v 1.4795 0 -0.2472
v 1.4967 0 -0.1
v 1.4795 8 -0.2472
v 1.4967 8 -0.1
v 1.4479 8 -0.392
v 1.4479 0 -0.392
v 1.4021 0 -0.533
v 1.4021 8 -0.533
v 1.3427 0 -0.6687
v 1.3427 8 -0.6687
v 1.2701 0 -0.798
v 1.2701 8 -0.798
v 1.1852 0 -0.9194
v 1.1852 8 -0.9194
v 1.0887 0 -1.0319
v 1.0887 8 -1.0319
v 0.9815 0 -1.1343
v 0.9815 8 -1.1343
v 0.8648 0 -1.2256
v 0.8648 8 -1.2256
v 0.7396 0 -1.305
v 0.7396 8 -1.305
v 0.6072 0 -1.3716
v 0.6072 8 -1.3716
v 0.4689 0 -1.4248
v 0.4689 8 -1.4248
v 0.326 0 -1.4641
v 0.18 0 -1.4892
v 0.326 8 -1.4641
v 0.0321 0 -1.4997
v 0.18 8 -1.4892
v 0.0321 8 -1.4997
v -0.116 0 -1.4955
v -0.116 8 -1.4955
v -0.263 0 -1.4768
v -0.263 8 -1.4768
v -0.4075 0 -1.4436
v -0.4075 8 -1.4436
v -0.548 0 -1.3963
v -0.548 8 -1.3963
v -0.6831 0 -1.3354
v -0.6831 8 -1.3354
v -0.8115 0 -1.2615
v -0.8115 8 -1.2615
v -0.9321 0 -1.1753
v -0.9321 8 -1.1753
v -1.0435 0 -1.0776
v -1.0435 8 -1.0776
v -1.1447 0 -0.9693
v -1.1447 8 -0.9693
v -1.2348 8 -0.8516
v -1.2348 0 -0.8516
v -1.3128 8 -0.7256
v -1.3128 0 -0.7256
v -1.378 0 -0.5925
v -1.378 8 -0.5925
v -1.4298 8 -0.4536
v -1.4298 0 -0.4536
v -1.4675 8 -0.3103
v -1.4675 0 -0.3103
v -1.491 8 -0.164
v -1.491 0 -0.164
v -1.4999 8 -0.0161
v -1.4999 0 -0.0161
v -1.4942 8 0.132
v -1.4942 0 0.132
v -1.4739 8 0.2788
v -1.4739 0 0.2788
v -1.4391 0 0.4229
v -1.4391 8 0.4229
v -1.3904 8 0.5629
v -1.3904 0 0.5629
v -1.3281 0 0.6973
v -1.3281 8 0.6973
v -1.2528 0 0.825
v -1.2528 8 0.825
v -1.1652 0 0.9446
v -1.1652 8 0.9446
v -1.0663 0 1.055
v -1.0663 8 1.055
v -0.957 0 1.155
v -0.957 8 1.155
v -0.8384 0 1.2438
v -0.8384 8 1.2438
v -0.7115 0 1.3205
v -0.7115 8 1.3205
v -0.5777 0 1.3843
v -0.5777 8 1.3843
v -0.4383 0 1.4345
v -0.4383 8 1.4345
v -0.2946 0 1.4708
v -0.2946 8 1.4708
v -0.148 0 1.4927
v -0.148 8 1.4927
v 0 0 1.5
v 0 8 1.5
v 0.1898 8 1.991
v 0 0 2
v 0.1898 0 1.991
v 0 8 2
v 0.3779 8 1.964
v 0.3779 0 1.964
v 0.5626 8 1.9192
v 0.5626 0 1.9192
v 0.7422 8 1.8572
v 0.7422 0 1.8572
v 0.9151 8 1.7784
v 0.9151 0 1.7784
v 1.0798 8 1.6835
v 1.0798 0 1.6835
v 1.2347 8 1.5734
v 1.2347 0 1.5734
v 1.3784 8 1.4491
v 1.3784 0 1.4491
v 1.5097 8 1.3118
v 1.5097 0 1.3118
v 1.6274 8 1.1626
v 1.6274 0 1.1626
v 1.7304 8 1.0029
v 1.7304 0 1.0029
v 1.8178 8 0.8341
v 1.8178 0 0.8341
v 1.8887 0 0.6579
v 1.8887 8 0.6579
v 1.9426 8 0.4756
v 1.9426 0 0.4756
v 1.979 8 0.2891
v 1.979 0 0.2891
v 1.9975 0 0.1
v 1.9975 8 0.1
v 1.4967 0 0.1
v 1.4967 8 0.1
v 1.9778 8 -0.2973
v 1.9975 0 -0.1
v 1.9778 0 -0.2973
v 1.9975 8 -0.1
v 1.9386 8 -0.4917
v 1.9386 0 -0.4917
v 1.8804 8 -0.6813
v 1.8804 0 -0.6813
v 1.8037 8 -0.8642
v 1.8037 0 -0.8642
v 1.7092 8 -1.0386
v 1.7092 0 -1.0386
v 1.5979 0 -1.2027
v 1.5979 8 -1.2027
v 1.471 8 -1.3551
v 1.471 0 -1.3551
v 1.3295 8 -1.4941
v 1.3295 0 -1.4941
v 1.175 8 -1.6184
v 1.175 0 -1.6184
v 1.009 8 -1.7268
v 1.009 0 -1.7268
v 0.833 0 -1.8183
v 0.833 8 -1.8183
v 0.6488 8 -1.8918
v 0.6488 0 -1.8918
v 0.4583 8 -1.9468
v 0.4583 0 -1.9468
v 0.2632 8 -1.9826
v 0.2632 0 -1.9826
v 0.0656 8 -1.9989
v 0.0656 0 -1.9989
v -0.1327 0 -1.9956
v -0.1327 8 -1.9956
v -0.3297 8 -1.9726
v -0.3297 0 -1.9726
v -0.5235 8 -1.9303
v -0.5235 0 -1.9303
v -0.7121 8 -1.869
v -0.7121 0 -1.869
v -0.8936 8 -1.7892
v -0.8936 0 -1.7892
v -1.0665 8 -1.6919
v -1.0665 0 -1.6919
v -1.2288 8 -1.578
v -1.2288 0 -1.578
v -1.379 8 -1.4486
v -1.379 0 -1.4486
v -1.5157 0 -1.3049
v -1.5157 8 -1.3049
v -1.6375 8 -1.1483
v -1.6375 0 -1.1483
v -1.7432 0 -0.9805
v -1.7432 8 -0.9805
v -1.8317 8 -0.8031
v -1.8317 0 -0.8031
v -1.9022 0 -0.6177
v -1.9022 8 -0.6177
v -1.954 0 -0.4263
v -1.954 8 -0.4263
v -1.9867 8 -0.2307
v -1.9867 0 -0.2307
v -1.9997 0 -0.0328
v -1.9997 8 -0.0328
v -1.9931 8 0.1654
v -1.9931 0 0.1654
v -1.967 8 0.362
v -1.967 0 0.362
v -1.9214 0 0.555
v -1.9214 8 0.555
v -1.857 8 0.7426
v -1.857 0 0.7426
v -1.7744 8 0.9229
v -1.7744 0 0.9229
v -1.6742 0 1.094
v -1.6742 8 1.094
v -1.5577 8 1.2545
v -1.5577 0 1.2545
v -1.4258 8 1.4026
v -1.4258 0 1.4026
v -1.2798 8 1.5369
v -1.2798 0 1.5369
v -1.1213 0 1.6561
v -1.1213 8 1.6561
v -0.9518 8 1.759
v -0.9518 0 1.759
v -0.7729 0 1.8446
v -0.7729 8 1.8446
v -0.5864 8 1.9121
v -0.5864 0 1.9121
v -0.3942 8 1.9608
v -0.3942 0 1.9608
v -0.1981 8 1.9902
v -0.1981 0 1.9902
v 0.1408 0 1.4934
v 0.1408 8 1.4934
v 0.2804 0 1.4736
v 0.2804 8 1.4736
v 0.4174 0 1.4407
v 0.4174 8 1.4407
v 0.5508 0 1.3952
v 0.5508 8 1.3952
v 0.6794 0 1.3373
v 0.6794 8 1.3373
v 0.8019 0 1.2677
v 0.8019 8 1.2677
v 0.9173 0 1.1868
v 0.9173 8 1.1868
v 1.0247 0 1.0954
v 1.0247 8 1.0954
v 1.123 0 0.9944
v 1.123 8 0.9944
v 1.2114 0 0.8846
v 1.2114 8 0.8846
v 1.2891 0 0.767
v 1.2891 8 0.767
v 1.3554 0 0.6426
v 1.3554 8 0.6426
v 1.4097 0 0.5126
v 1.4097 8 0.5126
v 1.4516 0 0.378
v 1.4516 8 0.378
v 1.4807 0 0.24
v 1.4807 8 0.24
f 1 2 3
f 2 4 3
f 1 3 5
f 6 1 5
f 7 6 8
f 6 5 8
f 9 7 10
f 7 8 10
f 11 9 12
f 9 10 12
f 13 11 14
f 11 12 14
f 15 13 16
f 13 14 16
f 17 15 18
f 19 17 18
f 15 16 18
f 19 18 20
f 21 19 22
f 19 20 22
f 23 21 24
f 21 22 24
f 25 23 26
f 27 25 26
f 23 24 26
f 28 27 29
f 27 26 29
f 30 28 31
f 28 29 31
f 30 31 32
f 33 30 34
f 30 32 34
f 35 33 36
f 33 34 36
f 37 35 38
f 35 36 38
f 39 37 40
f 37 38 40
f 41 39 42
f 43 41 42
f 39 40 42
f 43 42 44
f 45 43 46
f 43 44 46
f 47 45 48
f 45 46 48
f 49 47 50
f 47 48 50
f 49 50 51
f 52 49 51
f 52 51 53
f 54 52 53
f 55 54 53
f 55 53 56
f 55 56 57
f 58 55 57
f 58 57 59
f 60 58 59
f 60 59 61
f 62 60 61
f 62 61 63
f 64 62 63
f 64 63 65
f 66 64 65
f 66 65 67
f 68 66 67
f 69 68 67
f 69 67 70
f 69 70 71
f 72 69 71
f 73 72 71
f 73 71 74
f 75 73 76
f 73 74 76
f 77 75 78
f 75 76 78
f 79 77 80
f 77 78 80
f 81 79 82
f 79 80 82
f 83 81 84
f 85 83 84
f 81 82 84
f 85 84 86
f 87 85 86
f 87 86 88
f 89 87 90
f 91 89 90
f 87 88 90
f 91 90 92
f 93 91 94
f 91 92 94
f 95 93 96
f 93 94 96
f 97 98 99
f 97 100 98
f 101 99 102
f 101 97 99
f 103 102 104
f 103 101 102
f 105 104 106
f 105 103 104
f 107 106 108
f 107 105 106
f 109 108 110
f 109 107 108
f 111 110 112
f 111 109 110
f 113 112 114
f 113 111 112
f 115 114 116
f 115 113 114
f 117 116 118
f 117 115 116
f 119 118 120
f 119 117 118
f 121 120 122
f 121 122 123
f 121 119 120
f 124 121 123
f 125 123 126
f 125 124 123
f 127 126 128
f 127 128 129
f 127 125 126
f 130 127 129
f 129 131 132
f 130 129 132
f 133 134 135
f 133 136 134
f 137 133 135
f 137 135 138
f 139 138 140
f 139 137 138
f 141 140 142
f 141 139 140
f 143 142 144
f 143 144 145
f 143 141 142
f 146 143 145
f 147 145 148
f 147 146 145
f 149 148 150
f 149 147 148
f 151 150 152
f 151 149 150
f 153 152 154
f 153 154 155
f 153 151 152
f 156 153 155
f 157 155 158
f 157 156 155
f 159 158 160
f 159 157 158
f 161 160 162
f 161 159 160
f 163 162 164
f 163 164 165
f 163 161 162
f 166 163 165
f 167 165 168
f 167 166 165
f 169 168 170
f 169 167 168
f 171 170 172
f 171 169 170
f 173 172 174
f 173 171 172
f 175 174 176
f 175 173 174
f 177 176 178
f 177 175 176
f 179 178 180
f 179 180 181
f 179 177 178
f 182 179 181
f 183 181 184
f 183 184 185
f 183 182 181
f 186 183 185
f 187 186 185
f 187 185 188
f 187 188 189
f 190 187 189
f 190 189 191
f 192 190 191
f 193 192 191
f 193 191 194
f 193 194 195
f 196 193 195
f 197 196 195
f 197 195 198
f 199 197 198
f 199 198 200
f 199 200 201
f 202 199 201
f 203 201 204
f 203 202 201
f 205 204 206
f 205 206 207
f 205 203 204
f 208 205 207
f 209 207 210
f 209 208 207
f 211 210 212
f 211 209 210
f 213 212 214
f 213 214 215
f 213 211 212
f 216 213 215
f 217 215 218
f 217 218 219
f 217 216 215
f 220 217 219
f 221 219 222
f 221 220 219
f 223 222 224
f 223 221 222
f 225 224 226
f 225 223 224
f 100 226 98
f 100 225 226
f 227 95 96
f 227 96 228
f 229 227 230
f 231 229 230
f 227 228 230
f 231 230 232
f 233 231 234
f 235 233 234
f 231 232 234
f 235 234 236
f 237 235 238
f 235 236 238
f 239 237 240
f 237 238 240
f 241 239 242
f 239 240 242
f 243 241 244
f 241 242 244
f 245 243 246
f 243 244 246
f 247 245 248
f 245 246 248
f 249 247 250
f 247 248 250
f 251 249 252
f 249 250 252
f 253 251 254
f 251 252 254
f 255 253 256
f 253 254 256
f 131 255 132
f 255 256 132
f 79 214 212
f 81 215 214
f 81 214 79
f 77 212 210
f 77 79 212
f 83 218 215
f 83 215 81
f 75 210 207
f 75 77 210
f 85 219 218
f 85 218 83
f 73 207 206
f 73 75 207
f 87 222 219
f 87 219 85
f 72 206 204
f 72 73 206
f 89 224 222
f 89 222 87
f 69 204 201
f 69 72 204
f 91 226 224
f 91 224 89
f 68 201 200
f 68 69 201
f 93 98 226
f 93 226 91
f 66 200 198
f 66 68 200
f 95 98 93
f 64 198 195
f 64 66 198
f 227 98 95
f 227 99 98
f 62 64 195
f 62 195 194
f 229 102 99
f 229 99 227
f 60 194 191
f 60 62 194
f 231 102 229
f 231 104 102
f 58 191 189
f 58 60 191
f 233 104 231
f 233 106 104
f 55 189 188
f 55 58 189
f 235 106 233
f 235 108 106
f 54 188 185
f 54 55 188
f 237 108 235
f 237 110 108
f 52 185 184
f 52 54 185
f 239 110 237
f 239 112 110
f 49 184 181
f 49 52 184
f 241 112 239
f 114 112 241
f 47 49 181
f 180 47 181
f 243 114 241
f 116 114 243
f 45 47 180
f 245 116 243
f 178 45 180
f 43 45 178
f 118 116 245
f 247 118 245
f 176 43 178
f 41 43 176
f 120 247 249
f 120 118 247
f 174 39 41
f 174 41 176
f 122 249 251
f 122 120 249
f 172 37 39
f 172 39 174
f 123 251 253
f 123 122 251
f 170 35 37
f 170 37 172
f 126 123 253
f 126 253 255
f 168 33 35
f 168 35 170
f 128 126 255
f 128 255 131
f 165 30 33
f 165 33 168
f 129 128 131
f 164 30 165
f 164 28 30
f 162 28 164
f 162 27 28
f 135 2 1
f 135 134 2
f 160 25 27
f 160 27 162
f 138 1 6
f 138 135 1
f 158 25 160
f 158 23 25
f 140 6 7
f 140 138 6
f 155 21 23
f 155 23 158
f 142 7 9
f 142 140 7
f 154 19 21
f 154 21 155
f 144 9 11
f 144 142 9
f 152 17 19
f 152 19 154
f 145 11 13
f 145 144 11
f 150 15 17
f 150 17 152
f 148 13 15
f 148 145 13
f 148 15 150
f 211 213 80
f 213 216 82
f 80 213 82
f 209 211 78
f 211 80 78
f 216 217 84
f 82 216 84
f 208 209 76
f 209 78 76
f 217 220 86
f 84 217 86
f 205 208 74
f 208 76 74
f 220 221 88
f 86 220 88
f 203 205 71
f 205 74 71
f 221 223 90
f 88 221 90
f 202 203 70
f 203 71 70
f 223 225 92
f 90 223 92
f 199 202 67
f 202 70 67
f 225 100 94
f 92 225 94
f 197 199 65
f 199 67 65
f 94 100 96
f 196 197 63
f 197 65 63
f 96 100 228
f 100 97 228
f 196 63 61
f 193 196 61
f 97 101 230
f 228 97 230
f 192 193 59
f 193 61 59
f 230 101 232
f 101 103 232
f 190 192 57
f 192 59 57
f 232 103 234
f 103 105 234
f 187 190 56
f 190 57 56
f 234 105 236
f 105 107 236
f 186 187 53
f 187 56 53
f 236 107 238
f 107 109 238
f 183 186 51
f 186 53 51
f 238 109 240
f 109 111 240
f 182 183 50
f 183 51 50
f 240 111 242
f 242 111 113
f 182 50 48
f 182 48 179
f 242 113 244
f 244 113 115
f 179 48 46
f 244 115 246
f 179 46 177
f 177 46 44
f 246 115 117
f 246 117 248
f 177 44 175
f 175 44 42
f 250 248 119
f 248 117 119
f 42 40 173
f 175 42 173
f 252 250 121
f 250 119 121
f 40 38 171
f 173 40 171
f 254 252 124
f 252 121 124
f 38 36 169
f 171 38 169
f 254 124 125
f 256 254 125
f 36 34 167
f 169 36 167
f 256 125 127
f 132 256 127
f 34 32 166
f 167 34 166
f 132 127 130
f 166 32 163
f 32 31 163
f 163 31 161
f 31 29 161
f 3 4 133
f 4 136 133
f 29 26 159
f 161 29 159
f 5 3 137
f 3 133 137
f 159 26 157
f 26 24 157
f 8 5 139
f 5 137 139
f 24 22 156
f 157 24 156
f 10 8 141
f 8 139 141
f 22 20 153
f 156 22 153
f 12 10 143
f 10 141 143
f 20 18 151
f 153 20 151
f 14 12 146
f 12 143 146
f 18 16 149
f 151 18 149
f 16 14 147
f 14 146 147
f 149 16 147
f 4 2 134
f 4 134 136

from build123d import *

# Parameters (mm, degrees)
SKETCH1_W          = 0.5
SKETCH1_H          = 8
SKETCH2_W          = 0.2
SKETCH2_H          = 8
CUT_EXTRUDE1_DEPTH = 4


with BuildPart() as part:
    # Sketch1 → Revolve1 (revolve)
    with BuildSketch(Plane.XY, mode=Mode.PRIVATE) as revolve1_sk:
        with Locations((1.75, 4)):
            Rectangle(SKETCH1_W, SKETCH1_H)
    revolve(revolve1_sk.sketch.rotate(Axis((0, 0, 0), (0, 1, 0)), 270), axis=Axis((0, 0, 0), (0, 1, 0)))

    # Sketch2 → Cut-Extrude1 (cut)
    with BuildSketch(Plane(origin=(0, 0, 0), x_dir=(0, 0, -1), z_dir=(1, 0, 0))):
        with Locations((0, 4)):
            Rectangle(SKETCH2_W, SKETCH2_H)
    extrude(amount=CUT_EXTRUDE1_DEPTH, mode=Mode.SUBTRACT)


solid = part.part
